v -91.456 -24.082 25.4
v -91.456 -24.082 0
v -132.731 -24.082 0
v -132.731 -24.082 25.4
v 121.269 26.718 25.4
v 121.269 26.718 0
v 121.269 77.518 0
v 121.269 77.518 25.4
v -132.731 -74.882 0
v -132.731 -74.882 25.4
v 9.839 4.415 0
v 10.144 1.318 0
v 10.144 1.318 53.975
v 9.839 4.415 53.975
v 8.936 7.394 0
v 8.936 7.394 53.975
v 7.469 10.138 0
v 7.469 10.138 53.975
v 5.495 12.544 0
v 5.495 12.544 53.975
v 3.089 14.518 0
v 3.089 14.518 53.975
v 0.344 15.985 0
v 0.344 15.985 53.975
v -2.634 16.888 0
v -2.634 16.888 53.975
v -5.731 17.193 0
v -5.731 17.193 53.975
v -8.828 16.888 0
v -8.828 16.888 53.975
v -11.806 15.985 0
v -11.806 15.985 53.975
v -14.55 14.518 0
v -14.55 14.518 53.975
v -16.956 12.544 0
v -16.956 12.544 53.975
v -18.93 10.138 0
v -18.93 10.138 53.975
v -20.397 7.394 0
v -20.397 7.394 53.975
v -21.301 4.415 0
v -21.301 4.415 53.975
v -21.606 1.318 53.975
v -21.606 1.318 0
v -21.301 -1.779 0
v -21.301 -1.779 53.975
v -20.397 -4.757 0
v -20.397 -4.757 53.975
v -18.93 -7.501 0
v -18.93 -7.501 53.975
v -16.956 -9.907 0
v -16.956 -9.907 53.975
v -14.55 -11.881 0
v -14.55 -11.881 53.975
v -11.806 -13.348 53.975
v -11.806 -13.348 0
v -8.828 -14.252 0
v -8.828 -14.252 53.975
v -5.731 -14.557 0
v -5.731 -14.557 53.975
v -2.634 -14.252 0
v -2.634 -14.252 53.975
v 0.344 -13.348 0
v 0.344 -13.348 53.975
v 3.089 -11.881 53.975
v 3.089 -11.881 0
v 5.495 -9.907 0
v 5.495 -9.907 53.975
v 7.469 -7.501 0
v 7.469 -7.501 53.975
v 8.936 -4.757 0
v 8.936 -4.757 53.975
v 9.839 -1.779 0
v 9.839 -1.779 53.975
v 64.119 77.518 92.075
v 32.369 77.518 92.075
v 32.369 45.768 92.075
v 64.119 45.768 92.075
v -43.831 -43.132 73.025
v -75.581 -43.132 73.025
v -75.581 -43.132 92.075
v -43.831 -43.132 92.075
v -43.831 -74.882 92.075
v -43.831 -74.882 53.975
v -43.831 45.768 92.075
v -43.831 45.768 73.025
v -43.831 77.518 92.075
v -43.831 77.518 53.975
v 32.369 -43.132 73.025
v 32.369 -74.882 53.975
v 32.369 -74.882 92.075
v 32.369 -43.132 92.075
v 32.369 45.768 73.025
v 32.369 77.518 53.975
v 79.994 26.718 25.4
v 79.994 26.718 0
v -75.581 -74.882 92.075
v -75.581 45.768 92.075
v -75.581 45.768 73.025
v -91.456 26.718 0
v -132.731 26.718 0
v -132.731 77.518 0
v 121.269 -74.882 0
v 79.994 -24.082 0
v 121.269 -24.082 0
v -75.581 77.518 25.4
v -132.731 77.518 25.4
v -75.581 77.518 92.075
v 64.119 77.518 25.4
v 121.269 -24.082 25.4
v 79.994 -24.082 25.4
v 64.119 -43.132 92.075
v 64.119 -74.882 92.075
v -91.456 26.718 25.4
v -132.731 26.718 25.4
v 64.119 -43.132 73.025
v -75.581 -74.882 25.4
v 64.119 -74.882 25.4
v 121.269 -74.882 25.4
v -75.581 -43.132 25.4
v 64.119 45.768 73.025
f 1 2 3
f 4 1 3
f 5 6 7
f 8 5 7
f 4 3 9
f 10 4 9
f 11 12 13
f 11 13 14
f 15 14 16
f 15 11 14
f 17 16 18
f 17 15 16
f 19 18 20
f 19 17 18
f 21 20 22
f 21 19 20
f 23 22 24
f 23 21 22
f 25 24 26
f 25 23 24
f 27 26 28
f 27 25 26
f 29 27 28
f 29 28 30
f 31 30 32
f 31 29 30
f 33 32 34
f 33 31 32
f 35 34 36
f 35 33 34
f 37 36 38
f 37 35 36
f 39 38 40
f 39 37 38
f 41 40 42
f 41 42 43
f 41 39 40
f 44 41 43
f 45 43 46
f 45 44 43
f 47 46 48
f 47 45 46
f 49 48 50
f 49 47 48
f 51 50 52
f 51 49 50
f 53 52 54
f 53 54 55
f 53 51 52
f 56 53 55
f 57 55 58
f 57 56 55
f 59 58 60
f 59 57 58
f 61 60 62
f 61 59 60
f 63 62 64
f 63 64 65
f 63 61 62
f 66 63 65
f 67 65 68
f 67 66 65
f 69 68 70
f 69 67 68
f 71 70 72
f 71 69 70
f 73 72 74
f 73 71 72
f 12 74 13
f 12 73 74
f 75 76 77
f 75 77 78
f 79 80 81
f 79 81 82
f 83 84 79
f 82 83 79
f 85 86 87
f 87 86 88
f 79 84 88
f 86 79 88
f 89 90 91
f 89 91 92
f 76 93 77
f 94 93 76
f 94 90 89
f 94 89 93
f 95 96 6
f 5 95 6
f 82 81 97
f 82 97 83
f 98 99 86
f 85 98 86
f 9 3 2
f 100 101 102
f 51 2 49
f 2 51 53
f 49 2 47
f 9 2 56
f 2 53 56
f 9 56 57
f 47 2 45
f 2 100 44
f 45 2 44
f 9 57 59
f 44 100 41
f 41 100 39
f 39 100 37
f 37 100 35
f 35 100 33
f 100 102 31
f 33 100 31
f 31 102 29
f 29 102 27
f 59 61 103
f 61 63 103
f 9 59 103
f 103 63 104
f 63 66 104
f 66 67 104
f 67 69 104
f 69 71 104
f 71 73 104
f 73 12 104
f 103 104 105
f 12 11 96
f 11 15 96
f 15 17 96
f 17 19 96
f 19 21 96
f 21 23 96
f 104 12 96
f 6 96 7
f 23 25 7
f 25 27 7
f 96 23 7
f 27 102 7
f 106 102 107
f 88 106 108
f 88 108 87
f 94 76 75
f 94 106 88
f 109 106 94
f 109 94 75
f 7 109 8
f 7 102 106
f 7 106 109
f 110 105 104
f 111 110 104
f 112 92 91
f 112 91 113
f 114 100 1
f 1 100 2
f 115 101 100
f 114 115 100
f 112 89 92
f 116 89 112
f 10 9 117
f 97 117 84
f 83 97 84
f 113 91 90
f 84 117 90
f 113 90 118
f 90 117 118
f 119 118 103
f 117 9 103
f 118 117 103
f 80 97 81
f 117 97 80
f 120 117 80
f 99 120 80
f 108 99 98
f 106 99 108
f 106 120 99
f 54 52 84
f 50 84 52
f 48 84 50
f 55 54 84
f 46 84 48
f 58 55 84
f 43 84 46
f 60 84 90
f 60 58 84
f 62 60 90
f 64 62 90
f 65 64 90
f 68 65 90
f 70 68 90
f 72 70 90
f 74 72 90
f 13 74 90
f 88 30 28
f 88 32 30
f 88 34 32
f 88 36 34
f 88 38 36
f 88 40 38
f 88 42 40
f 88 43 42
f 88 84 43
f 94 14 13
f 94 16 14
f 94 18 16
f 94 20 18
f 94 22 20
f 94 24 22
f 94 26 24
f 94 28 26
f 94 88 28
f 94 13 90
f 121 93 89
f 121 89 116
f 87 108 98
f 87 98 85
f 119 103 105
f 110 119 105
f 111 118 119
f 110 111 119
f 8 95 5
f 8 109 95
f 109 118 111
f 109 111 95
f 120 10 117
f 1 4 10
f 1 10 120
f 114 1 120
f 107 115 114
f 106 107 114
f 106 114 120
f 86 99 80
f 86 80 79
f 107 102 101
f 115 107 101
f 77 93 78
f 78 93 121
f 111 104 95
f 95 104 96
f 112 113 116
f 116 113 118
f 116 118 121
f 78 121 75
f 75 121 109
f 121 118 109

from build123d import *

# Parameters (mm, degrees)
F1_DEPTH = 25.4
F0_R     = 15.875
F2_DEPTH = 53.975
F0_W     = 31.75
F0_H     = 88.9
F3_DEPTH = 73.025
F0_H_2   = 31.75
F4_DEPTH = 92.075


# Not quite as in the source:
# - a feature names something its author has since deleted; it is built from what else it names


with BuildPart() as f1:
    # F0 (on Top) → F1 (new body)
    with BuildSketch(Plane.XY):
        Polygon((-75.5807677343, 77.5184368145), (-132.7307677343, 77.5184368145), (-132.7307677343, 26.7184368145), (-91.4557677343, 26.7184368145), (-91.4557677343, -24.0815631855), (-132.7307677343, -24.0815631855), (-132.7307677343, -74.8815631855), (-75.5807677344, -74.8815631855), (-75.5807677343, -43.1315631855), (-75.5807677343, 45.7684368145), align=None)
    extrude(amount=F1_DEPTH)



with BuildPart() as f1b:
    # F0 (on Top) → F1, piece 2 (new body)
    with BuildSketch(Plane.XY):
        Polygon((121.2692322657, 77.5184368145), (64.1192322657, 77.5184368145), (64.1192322657, 45.7684368145), (64.1192322657, -43.1315631855), (64.1192322657, -74.8815631855), (121.2692322657, -74.8815631855), (121.2692322657, -24.0815631855), (79.9942322657, -24.0815631855), (79.9942322657, 26.7184368145), (121.2692322657, 26.7184368145), align=None)
    extrude(amount=F1_DEPTH)


with BuildPart() as f2:
    # F0 (on Top) → F2 (new body)
    with BuildSketch(Plane.XY):
        Polygon((32.3692322657, 77.5184368145), (-43.8307677343, 77.5184368145), (-43.8307677343, 45.7684368145), (-43.8307677343, -43.1315631855), (-43.8307677343, -74.8815631855), (32.3692322657, -74.8815631855), (32.3692322657, -43.1315631855), (32.3692322657, 45.7684368145), align=None)
        with Locations((-5.7307677343, 1.3184368145)):
            Circle(F0_R, mode=Mode.SUBTRACT)
    extrude(amount=F2_DEPTH)


with BuildPart() as f1_1:
    add(f1.part)

    add(f1b.part)  # F3 merges F1b

    add(f2.part)  # F3 merges F2
    # F0 (on Top) → F3 (join)
    with BuildSketch(Plane.XY):
        with Locations((-59.7057677343, 1.3184368145)):
            Rectangle(F0_W, F0_H)
        with Locations((48.2442322657, 1.3184368145)):
            Rectangle(F0_W, F0_H)
    extrude(amount=F3_DEPTH)

    # F0 (on Top) → F4 (join)
    with BuildSketch(Plane.XY):
        with Locations((-59.7057677343, 61.6434368145)):
            Rectangle(F0_W, F0_H_2)
        with Locations((48.2442322657, 61.6434368145)):
            Rectangle(F0_W, F0_H_2)
        with Locations((-59.7057677343, -59.0065631855)):
            Rectangle(F0_W, F0_H_2)
        with Locations((48.2442322657, -59.0065631855)):
            Rectangle(F0_W, F0_H_2)
    extrude(amount=F4_DEPTH)


solid = f1_1.part
